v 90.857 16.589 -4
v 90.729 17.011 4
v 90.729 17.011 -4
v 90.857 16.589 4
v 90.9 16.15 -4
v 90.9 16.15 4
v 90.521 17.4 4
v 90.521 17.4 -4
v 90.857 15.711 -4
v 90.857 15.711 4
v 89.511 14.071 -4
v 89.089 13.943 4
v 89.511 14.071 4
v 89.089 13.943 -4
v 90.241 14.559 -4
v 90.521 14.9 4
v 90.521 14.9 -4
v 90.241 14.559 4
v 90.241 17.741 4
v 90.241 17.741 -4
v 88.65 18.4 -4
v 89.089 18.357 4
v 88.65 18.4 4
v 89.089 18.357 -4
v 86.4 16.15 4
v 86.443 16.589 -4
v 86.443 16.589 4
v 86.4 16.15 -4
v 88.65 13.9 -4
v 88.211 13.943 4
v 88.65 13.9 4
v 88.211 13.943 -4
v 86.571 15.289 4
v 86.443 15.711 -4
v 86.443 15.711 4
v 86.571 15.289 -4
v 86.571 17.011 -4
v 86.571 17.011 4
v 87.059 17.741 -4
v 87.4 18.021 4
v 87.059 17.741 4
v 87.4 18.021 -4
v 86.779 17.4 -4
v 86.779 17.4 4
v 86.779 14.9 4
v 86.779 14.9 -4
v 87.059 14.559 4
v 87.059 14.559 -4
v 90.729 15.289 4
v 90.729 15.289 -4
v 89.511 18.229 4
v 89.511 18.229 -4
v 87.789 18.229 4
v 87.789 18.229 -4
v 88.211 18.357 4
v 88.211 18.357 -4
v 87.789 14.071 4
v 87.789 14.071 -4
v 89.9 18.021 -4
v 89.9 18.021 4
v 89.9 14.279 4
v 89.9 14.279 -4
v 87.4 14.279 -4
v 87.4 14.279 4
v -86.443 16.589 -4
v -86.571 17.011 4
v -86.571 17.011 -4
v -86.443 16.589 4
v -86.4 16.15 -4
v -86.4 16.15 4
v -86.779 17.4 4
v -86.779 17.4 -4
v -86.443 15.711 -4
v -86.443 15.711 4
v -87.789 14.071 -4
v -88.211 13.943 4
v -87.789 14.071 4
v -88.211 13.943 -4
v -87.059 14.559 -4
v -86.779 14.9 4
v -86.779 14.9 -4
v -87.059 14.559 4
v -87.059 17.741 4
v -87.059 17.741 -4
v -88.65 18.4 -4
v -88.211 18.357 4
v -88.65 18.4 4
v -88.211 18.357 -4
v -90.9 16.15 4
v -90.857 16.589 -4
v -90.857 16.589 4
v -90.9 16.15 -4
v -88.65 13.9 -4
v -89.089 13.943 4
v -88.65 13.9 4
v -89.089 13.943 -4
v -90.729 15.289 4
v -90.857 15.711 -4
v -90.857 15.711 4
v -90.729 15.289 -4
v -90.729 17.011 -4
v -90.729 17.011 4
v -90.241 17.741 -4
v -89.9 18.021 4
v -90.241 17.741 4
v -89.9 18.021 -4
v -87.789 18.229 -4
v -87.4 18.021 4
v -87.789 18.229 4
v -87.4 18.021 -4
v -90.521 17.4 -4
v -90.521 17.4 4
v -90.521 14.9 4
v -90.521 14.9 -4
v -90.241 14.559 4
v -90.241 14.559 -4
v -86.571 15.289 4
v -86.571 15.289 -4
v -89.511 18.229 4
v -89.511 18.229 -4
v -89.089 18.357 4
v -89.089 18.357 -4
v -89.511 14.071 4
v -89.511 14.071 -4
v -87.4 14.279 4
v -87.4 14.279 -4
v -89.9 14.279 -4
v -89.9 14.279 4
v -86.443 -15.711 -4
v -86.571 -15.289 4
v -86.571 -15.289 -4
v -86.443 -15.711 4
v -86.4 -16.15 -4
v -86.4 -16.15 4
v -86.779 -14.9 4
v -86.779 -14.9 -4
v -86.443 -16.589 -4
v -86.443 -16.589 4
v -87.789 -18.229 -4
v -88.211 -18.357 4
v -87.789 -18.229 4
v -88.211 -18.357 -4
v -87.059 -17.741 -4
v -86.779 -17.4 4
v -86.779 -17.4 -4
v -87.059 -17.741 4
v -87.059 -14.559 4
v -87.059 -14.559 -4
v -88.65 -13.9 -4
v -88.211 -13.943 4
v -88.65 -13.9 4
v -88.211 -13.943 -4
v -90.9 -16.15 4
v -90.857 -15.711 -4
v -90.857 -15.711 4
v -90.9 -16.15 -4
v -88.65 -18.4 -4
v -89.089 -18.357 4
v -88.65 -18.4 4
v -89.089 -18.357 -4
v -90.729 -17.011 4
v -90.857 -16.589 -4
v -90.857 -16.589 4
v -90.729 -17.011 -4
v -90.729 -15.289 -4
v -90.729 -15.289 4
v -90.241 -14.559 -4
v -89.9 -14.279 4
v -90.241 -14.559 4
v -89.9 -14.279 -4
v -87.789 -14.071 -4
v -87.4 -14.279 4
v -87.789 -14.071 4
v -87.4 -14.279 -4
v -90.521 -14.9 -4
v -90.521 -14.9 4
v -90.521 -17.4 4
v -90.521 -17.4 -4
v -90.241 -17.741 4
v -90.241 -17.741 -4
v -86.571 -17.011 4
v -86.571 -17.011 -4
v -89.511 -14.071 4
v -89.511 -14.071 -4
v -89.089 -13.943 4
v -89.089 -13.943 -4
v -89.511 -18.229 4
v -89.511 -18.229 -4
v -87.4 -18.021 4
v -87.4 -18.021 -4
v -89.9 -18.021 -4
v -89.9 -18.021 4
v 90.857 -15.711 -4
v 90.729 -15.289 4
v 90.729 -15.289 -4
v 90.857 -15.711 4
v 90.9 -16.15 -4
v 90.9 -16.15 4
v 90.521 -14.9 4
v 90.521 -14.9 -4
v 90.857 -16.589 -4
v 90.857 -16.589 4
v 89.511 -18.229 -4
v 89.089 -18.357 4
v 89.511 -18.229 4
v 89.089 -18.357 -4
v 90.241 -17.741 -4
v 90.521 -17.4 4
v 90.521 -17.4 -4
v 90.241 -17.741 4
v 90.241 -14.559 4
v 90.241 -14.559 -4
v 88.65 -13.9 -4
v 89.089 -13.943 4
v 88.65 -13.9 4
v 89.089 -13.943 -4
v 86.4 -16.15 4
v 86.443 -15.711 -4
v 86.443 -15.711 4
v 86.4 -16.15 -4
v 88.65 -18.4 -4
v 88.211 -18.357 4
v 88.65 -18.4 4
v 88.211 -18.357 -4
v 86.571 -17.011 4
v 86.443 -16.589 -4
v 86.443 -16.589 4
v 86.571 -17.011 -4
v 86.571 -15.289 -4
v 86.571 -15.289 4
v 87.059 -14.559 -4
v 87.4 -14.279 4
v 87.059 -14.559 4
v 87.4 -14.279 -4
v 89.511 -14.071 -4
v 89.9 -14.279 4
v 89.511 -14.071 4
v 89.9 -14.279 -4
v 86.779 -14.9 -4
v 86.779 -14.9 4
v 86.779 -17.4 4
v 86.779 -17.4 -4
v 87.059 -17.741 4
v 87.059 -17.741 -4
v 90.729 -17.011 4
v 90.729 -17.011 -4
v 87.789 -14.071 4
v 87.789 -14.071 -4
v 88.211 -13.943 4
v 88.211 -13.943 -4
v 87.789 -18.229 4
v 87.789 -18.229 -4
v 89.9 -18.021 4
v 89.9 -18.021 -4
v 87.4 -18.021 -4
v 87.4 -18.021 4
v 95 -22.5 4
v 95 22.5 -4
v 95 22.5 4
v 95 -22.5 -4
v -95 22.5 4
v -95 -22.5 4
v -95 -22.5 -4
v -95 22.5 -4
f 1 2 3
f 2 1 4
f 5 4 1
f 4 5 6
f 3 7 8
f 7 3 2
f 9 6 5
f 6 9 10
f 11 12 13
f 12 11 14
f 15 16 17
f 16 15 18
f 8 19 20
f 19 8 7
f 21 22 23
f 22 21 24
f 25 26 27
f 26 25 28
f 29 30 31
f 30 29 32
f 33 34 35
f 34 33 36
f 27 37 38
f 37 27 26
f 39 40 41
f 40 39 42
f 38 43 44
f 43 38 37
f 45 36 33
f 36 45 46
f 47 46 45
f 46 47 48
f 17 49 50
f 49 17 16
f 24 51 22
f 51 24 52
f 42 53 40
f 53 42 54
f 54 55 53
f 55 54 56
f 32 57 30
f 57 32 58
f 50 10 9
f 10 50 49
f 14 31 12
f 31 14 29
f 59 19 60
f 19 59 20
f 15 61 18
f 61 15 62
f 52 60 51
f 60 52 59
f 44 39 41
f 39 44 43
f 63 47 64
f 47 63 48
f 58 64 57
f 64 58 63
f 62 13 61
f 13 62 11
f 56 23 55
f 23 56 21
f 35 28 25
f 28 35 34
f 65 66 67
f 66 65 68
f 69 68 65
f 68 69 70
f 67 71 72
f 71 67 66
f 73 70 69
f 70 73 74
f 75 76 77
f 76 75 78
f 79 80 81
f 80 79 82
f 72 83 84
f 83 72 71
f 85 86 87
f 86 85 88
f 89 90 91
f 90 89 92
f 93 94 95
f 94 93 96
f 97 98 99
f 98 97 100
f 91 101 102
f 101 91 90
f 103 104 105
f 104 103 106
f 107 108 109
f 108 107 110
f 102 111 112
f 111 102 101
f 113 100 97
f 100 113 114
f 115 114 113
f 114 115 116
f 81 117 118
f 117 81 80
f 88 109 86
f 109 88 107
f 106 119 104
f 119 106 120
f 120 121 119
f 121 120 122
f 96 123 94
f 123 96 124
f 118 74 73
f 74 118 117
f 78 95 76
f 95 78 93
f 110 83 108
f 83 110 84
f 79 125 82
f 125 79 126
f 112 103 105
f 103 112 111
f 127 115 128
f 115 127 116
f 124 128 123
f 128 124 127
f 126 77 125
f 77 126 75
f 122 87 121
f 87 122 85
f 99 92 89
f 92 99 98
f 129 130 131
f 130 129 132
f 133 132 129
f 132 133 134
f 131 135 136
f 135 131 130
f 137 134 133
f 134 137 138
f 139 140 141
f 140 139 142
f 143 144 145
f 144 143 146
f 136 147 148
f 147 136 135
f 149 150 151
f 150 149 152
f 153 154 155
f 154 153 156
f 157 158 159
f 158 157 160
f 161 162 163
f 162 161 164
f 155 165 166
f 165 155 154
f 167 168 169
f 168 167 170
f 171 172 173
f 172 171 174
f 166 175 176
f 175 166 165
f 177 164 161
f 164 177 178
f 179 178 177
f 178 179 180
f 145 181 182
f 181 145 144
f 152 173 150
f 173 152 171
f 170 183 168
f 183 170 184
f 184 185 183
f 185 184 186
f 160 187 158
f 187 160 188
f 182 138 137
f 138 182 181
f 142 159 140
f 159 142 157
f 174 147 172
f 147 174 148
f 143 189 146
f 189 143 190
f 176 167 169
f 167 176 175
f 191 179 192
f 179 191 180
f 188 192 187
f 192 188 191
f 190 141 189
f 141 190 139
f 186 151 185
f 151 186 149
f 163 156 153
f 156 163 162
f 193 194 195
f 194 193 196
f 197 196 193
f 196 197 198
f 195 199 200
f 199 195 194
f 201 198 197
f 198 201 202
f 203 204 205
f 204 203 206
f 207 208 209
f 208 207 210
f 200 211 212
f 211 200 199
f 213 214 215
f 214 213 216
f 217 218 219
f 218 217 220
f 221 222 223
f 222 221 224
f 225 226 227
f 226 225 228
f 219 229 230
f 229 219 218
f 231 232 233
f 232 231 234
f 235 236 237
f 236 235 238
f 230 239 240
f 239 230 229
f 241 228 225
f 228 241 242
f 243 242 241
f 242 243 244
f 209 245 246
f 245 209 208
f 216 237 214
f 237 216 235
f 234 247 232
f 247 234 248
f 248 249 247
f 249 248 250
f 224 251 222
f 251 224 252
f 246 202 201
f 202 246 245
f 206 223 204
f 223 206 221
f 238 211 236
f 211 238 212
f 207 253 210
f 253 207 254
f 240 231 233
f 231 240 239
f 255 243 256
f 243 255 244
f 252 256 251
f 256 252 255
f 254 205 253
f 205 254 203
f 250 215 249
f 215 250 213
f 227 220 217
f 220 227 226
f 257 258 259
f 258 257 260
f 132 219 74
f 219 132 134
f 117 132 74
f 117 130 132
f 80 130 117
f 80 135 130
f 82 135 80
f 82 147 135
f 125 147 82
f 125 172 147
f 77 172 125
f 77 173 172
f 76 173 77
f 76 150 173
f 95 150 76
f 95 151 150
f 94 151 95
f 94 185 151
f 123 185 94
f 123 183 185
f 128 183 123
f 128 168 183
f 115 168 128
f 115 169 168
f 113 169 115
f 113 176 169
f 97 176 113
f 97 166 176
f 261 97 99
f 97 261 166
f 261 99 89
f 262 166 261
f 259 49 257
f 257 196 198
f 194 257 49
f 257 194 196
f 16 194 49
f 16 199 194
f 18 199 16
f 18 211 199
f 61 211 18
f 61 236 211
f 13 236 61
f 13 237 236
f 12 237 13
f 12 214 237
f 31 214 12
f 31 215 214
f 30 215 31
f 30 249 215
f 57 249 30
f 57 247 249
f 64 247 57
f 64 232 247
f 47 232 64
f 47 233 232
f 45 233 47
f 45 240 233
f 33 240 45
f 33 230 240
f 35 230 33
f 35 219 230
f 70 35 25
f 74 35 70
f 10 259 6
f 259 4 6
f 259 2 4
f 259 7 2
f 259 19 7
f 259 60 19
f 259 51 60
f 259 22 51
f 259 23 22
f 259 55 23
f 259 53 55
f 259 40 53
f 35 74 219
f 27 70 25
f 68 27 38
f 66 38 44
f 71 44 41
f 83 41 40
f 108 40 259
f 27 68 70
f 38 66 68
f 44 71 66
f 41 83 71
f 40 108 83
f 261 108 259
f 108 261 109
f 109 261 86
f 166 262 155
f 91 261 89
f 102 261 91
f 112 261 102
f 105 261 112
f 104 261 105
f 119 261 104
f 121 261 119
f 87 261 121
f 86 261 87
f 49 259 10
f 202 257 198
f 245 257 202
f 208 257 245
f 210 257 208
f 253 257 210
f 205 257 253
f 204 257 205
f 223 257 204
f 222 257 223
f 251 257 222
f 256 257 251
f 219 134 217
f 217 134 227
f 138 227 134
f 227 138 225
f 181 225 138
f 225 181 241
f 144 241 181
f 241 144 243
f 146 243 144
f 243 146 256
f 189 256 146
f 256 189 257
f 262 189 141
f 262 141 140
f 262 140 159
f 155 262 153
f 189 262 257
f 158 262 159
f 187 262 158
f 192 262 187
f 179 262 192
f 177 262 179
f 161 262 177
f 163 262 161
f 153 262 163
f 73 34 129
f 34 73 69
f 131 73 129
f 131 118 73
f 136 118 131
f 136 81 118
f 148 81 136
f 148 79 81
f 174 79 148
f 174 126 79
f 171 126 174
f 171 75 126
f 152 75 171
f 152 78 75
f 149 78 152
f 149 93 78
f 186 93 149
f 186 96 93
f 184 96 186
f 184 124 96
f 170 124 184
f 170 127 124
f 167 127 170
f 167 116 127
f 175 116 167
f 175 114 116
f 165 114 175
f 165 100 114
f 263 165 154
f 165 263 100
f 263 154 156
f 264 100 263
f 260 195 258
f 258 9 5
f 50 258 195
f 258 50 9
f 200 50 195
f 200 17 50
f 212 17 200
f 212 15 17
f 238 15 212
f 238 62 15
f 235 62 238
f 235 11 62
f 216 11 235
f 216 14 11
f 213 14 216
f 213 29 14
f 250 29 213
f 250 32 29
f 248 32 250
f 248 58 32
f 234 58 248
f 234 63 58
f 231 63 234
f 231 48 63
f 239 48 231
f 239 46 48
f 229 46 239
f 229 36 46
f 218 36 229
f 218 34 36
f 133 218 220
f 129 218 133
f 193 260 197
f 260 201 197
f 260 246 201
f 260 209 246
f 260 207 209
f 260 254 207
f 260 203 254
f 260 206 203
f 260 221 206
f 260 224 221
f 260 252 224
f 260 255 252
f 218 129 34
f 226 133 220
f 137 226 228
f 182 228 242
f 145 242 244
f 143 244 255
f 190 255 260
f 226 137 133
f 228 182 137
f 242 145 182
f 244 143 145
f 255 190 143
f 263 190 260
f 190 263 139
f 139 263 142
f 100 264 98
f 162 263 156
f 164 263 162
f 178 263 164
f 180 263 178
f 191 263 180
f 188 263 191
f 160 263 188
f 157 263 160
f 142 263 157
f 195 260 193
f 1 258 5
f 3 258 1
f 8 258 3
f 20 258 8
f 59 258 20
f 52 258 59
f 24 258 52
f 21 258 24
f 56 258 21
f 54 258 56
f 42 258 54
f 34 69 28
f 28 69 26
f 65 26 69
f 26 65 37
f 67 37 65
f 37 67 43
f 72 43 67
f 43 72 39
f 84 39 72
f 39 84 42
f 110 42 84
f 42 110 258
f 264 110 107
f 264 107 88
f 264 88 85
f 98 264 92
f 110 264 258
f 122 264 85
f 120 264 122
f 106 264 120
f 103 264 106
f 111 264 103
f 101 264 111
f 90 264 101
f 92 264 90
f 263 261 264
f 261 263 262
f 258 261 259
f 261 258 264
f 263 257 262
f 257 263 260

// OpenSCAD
$fn = 32;

// ----------------------------------------------------------------------
// Corner plate 190 x 45 x 8
// 4 holes, centres taken from the edge offset
// ----------------------------------------------------------------------

// --- parameters (mm) ---
plate = [190, 45, 8];  // overall size (x, y, z)
holes = 4;             // number of holes the drawing asks for
hole_d = 4.5;          // hole diameter
edge = 6.35;           // hole centre offset from the plate edge

// --- derived feature positions (mm) ---
corner_x = plate[0] / 2 - edge;  // = 88.65   corner hole X
corner_y = plate[1] / 2 - edge;  // = 16.15   corner hole Y
feature_centers = [
  [corner_x, corner_y],
  [-corner_x, corner_y],
  [-corner_x, -corner_y],
  [corner_x, -corner_y]
];   // hole centres the loop below drills

// plate outline, every hole drilled through with the same cutters
difference() {
  cube(plate, center = true);
  for (centre = feature_centers)
    translate([centre[0], centre[1], 0])
      cylinder(d = hole_d, h = plate[2] + 2, center = true);
}
